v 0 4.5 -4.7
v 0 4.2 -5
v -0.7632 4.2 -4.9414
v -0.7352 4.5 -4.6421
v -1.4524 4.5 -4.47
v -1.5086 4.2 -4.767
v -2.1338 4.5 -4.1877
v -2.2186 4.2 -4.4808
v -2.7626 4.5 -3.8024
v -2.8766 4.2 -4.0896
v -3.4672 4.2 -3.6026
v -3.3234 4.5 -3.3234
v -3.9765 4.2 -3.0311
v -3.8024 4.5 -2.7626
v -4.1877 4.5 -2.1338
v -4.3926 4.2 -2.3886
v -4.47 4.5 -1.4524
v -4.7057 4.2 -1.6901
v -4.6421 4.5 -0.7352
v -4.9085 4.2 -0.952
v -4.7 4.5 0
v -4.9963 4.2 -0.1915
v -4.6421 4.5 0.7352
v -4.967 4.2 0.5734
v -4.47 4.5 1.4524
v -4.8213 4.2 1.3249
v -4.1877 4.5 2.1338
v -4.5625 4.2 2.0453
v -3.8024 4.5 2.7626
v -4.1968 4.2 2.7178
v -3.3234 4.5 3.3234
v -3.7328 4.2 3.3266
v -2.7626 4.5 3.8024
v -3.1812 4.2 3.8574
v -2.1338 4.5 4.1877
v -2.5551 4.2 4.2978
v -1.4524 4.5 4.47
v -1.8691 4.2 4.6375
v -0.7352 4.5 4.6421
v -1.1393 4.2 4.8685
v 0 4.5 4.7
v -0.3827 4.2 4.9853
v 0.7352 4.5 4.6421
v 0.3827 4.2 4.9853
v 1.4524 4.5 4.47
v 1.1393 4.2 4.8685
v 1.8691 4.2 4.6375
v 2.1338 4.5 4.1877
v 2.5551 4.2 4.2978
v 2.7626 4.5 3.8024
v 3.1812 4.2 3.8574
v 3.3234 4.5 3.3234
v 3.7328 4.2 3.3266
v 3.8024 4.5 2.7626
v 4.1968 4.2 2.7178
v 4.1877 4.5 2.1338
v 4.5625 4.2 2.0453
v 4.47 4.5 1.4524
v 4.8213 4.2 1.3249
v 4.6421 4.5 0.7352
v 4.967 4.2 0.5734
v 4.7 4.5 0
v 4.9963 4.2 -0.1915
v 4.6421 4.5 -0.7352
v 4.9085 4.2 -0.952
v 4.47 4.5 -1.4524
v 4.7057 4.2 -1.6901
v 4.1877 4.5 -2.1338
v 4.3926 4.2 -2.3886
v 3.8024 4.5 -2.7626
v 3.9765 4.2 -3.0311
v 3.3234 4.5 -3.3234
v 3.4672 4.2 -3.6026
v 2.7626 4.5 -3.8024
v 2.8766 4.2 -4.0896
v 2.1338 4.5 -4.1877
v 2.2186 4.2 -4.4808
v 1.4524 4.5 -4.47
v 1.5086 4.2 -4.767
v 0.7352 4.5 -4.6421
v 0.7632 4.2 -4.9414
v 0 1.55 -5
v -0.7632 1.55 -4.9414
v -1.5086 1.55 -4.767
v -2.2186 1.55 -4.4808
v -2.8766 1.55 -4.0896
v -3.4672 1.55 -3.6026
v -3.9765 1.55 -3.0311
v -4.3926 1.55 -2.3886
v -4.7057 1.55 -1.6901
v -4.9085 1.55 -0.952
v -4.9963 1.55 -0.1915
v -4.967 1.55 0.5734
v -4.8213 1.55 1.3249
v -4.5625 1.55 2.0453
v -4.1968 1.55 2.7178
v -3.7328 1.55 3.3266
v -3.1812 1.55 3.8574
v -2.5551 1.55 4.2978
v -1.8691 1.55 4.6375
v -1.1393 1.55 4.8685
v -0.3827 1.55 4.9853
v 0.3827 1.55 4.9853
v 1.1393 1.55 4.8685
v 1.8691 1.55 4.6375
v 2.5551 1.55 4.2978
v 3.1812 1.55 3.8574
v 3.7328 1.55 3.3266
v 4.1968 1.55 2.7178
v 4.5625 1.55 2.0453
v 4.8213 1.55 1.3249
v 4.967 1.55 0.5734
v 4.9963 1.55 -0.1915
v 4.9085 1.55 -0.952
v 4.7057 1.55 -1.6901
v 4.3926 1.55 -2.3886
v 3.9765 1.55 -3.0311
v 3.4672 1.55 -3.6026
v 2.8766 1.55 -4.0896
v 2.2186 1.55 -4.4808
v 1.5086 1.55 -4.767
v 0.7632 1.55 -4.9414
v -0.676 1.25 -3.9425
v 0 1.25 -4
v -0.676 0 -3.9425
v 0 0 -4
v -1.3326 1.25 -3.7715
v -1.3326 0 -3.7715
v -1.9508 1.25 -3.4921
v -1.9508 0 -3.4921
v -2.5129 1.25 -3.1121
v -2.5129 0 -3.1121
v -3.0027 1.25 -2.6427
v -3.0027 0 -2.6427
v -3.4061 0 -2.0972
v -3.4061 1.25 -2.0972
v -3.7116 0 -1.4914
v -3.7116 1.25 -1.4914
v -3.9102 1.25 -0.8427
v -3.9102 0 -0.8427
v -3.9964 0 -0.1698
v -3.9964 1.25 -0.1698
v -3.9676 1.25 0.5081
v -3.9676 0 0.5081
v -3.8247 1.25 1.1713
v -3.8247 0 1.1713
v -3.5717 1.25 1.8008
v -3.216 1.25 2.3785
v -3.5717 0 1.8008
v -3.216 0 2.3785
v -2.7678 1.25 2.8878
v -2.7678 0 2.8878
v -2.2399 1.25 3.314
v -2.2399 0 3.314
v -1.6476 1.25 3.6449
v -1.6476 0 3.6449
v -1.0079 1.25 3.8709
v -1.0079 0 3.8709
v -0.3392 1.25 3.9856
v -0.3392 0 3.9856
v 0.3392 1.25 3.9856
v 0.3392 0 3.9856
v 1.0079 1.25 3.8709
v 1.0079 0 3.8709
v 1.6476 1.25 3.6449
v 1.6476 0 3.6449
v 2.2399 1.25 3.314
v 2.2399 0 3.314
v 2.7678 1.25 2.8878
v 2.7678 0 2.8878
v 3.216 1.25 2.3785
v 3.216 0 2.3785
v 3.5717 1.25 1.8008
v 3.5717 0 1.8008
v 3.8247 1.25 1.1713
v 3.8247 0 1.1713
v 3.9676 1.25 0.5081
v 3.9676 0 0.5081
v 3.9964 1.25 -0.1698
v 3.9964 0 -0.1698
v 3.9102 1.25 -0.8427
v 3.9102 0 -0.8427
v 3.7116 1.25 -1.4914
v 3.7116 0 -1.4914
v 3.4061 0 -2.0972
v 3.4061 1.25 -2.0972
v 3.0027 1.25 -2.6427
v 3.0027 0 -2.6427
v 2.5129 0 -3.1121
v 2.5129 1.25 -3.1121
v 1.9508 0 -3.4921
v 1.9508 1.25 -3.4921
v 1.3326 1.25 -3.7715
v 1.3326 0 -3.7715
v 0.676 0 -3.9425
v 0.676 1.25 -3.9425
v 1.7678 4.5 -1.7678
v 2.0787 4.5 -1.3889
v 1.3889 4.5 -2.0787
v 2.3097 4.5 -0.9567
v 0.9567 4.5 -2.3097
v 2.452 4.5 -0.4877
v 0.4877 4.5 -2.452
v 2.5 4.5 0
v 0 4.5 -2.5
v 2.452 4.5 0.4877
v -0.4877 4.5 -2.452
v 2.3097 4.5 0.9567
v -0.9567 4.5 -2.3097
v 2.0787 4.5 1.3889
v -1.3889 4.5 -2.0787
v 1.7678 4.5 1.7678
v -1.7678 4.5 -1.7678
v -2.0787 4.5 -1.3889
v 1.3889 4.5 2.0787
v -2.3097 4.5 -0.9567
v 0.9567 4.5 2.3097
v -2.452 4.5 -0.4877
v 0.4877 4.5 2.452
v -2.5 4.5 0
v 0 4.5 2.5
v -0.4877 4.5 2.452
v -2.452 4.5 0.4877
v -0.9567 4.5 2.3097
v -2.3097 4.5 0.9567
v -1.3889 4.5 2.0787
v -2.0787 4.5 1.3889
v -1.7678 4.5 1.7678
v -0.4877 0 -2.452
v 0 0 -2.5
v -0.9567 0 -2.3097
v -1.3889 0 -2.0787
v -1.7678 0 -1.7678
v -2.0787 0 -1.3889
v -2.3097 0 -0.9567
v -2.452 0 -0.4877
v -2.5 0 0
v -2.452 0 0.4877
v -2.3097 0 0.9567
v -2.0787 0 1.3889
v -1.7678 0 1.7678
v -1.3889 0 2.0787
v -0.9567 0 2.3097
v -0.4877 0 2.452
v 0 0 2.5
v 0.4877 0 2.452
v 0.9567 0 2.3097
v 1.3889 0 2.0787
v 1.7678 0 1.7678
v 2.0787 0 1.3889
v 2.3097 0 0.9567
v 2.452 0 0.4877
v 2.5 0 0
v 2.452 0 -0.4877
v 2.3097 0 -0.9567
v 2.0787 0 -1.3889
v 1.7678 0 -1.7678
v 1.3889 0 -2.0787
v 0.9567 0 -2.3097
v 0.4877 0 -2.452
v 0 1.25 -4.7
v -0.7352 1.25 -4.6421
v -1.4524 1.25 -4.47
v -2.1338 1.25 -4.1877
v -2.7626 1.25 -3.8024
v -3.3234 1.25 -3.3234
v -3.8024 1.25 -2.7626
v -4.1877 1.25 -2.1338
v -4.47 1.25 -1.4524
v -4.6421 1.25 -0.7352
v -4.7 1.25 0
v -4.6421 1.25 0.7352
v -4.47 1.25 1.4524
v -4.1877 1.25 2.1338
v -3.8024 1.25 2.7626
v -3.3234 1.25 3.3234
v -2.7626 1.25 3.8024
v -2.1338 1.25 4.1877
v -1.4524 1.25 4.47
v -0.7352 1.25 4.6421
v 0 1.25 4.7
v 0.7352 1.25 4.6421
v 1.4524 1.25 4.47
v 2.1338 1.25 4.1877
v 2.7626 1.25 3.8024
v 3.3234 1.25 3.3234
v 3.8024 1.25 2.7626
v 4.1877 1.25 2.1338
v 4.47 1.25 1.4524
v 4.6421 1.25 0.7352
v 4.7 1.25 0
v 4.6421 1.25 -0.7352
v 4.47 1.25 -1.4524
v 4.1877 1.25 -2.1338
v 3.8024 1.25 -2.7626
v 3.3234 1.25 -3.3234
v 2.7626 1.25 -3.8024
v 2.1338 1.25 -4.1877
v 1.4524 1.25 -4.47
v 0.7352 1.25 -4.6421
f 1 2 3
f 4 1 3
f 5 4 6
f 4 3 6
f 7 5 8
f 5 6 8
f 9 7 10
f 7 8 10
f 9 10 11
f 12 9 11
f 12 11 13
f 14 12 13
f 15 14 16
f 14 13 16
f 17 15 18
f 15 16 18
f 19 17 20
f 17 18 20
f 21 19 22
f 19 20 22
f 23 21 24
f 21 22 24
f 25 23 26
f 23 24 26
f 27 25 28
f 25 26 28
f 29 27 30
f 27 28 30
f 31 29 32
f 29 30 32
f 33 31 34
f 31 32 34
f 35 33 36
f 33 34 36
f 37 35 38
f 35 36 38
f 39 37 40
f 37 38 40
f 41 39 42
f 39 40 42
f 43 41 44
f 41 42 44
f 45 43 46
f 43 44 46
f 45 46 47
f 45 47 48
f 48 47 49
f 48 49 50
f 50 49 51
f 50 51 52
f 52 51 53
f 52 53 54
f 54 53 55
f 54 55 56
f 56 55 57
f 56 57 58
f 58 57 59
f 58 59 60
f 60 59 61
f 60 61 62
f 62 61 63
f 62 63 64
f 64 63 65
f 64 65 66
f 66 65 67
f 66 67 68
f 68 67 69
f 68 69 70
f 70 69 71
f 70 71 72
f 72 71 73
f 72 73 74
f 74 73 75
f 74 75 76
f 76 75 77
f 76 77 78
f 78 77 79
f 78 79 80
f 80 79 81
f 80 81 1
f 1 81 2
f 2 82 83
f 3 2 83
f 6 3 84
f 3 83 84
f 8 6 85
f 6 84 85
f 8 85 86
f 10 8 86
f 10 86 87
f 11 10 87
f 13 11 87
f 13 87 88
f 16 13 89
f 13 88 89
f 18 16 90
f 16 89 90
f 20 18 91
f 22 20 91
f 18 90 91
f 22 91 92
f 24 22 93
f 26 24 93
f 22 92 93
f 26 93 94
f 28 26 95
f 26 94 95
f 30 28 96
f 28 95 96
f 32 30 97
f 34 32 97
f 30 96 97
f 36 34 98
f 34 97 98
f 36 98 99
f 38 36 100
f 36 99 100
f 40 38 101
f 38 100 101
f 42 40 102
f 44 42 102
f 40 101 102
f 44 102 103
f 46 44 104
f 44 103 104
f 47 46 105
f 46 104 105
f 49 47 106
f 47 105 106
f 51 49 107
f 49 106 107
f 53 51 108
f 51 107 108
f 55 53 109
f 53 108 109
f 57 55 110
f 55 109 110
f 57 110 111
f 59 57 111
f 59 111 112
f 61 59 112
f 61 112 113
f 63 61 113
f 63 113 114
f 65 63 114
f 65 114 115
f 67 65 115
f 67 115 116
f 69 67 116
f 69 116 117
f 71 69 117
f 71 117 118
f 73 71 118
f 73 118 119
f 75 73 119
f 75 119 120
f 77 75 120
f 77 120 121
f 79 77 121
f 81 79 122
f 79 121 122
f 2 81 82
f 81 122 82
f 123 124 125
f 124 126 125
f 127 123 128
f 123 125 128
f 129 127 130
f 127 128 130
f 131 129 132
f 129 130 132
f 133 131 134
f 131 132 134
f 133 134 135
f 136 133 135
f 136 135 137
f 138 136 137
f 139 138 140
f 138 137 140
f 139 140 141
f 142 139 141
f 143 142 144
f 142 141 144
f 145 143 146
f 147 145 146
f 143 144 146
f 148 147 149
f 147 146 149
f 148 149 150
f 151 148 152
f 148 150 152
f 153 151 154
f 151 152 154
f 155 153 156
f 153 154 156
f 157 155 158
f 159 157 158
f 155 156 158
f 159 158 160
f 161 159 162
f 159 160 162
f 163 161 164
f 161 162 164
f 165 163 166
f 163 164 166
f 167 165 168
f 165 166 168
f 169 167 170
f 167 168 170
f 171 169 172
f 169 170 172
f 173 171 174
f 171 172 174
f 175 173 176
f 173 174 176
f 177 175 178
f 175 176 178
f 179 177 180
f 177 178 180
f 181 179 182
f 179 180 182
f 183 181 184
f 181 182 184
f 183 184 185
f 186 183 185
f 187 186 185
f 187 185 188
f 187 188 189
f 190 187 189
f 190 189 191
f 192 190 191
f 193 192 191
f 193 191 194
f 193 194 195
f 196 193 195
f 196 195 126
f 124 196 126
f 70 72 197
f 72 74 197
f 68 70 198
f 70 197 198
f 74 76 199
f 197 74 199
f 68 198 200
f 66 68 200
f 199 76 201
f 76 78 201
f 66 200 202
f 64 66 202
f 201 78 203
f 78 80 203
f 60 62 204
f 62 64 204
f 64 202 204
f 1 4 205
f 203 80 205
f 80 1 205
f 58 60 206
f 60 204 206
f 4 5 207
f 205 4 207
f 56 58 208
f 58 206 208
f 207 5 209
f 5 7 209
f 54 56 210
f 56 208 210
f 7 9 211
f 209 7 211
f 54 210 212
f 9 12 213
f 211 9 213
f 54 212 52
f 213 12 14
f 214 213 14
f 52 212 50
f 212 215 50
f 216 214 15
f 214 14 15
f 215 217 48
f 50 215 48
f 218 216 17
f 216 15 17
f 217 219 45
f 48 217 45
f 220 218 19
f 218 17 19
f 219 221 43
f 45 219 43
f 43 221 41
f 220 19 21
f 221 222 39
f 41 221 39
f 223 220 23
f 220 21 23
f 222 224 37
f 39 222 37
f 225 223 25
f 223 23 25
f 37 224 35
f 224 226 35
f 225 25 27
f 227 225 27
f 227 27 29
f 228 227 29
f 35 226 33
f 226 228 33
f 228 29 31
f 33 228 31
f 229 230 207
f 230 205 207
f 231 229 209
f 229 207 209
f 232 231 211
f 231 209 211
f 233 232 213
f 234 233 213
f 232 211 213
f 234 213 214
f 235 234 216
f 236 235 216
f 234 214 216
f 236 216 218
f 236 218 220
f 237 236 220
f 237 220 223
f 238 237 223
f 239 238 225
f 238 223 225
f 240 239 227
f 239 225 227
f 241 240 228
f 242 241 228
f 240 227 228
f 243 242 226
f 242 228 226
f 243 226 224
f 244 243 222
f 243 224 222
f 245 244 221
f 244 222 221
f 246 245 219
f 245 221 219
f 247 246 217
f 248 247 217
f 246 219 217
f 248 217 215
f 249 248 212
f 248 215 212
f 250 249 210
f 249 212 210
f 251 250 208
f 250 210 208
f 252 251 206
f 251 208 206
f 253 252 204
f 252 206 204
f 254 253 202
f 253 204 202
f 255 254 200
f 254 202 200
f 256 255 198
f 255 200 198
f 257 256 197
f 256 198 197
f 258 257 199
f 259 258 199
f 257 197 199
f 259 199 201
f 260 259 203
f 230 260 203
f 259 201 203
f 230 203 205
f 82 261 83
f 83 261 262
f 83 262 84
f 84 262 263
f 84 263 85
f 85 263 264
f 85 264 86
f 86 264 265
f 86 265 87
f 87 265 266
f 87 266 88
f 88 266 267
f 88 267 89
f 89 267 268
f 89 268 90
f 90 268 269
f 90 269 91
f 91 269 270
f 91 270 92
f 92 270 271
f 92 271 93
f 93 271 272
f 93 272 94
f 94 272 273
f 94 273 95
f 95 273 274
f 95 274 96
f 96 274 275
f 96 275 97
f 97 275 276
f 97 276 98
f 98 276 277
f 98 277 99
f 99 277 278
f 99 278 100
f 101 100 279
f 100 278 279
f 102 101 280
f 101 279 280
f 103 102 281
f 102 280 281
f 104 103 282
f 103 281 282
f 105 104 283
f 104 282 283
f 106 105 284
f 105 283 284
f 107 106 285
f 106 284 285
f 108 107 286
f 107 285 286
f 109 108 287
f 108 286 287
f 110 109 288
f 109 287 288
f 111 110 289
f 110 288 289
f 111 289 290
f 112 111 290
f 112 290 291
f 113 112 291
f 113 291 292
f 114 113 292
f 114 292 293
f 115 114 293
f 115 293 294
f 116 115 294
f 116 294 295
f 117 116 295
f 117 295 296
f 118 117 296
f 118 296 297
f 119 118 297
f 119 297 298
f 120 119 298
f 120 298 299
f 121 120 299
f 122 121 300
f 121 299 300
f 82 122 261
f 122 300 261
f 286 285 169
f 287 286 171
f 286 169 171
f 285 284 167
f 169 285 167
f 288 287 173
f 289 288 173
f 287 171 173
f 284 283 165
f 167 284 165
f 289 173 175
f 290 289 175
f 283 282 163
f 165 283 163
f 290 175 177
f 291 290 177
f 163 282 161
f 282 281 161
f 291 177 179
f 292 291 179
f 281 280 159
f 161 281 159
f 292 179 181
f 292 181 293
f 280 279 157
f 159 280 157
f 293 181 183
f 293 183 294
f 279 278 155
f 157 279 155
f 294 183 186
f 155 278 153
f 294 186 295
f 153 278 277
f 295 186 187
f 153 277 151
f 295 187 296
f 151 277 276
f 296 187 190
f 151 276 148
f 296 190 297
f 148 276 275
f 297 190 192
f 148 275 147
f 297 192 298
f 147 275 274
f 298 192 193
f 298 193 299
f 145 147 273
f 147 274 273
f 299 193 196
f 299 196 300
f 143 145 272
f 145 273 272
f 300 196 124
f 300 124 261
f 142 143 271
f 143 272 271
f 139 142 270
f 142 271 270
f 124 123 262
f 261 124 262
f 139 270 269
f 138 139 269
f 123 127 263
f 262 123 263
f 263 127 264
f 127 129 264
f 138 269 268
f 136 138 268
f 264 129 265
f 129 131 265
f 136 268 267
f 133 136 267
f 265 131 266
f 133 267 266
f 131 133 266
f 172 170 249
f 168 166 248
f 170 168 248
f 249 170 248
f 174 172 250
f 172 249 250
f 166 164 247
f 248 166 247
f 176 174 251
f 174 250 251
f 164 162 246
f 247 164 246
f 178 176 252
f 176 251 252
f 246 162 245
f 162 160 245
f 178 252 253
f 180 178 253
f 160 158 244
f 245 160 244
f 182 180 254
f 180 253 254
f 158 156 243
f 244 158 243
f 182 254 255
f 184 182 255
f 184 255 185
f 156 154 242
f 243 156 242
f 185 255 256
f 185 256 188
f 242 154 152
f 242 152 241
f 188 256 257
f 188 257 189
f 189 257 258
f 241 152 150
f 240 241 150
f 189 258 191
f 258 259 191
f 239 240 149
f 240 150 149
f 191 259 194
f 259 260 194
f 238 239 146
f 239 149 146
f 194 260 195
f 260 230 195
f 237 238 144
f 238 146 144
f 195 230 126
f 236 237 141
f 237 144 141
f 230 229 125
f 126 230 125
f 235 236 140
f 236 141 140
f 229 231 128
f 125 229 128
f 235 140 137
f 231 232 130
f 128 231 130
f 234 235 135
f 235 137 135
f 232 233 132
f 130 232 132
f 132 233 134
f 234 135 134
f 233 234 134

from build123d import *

# Parameters (mm, degrees)
CHANFREIN1_SIZE = 0.3


with BuildPart() as part:
    # Esquisse1 → Révolution1 (revolve)
    with BuildSketch(Plane.XY, mode=Mode.PRIVATE) as r_volution1_sk:
        Polygon((-2.5, 0), (-2.5, 4.5), (-5, 4.5), (-5, 1.25), (-4, 1.25), (-4, 0), align=None)
    revolve(r_volution1_sk.sketch.rotate(Axis((0, 0, 0), (0, 1, 0)), 270), axis=Axis((0, 0, 0), (0, 1, 0)))  # turned: the seam where the file's is

    # Chanfrein1
    chanfrein1_edges = [part.edges().sort_by_distance(p)[0] for p in [
        (0, 1.25, 5),
        (0, 4.5, 5),
    ]]
    chamfer(chanfrein1_edges, length=CHANFREIN1_SIZE)


solid = part.part
